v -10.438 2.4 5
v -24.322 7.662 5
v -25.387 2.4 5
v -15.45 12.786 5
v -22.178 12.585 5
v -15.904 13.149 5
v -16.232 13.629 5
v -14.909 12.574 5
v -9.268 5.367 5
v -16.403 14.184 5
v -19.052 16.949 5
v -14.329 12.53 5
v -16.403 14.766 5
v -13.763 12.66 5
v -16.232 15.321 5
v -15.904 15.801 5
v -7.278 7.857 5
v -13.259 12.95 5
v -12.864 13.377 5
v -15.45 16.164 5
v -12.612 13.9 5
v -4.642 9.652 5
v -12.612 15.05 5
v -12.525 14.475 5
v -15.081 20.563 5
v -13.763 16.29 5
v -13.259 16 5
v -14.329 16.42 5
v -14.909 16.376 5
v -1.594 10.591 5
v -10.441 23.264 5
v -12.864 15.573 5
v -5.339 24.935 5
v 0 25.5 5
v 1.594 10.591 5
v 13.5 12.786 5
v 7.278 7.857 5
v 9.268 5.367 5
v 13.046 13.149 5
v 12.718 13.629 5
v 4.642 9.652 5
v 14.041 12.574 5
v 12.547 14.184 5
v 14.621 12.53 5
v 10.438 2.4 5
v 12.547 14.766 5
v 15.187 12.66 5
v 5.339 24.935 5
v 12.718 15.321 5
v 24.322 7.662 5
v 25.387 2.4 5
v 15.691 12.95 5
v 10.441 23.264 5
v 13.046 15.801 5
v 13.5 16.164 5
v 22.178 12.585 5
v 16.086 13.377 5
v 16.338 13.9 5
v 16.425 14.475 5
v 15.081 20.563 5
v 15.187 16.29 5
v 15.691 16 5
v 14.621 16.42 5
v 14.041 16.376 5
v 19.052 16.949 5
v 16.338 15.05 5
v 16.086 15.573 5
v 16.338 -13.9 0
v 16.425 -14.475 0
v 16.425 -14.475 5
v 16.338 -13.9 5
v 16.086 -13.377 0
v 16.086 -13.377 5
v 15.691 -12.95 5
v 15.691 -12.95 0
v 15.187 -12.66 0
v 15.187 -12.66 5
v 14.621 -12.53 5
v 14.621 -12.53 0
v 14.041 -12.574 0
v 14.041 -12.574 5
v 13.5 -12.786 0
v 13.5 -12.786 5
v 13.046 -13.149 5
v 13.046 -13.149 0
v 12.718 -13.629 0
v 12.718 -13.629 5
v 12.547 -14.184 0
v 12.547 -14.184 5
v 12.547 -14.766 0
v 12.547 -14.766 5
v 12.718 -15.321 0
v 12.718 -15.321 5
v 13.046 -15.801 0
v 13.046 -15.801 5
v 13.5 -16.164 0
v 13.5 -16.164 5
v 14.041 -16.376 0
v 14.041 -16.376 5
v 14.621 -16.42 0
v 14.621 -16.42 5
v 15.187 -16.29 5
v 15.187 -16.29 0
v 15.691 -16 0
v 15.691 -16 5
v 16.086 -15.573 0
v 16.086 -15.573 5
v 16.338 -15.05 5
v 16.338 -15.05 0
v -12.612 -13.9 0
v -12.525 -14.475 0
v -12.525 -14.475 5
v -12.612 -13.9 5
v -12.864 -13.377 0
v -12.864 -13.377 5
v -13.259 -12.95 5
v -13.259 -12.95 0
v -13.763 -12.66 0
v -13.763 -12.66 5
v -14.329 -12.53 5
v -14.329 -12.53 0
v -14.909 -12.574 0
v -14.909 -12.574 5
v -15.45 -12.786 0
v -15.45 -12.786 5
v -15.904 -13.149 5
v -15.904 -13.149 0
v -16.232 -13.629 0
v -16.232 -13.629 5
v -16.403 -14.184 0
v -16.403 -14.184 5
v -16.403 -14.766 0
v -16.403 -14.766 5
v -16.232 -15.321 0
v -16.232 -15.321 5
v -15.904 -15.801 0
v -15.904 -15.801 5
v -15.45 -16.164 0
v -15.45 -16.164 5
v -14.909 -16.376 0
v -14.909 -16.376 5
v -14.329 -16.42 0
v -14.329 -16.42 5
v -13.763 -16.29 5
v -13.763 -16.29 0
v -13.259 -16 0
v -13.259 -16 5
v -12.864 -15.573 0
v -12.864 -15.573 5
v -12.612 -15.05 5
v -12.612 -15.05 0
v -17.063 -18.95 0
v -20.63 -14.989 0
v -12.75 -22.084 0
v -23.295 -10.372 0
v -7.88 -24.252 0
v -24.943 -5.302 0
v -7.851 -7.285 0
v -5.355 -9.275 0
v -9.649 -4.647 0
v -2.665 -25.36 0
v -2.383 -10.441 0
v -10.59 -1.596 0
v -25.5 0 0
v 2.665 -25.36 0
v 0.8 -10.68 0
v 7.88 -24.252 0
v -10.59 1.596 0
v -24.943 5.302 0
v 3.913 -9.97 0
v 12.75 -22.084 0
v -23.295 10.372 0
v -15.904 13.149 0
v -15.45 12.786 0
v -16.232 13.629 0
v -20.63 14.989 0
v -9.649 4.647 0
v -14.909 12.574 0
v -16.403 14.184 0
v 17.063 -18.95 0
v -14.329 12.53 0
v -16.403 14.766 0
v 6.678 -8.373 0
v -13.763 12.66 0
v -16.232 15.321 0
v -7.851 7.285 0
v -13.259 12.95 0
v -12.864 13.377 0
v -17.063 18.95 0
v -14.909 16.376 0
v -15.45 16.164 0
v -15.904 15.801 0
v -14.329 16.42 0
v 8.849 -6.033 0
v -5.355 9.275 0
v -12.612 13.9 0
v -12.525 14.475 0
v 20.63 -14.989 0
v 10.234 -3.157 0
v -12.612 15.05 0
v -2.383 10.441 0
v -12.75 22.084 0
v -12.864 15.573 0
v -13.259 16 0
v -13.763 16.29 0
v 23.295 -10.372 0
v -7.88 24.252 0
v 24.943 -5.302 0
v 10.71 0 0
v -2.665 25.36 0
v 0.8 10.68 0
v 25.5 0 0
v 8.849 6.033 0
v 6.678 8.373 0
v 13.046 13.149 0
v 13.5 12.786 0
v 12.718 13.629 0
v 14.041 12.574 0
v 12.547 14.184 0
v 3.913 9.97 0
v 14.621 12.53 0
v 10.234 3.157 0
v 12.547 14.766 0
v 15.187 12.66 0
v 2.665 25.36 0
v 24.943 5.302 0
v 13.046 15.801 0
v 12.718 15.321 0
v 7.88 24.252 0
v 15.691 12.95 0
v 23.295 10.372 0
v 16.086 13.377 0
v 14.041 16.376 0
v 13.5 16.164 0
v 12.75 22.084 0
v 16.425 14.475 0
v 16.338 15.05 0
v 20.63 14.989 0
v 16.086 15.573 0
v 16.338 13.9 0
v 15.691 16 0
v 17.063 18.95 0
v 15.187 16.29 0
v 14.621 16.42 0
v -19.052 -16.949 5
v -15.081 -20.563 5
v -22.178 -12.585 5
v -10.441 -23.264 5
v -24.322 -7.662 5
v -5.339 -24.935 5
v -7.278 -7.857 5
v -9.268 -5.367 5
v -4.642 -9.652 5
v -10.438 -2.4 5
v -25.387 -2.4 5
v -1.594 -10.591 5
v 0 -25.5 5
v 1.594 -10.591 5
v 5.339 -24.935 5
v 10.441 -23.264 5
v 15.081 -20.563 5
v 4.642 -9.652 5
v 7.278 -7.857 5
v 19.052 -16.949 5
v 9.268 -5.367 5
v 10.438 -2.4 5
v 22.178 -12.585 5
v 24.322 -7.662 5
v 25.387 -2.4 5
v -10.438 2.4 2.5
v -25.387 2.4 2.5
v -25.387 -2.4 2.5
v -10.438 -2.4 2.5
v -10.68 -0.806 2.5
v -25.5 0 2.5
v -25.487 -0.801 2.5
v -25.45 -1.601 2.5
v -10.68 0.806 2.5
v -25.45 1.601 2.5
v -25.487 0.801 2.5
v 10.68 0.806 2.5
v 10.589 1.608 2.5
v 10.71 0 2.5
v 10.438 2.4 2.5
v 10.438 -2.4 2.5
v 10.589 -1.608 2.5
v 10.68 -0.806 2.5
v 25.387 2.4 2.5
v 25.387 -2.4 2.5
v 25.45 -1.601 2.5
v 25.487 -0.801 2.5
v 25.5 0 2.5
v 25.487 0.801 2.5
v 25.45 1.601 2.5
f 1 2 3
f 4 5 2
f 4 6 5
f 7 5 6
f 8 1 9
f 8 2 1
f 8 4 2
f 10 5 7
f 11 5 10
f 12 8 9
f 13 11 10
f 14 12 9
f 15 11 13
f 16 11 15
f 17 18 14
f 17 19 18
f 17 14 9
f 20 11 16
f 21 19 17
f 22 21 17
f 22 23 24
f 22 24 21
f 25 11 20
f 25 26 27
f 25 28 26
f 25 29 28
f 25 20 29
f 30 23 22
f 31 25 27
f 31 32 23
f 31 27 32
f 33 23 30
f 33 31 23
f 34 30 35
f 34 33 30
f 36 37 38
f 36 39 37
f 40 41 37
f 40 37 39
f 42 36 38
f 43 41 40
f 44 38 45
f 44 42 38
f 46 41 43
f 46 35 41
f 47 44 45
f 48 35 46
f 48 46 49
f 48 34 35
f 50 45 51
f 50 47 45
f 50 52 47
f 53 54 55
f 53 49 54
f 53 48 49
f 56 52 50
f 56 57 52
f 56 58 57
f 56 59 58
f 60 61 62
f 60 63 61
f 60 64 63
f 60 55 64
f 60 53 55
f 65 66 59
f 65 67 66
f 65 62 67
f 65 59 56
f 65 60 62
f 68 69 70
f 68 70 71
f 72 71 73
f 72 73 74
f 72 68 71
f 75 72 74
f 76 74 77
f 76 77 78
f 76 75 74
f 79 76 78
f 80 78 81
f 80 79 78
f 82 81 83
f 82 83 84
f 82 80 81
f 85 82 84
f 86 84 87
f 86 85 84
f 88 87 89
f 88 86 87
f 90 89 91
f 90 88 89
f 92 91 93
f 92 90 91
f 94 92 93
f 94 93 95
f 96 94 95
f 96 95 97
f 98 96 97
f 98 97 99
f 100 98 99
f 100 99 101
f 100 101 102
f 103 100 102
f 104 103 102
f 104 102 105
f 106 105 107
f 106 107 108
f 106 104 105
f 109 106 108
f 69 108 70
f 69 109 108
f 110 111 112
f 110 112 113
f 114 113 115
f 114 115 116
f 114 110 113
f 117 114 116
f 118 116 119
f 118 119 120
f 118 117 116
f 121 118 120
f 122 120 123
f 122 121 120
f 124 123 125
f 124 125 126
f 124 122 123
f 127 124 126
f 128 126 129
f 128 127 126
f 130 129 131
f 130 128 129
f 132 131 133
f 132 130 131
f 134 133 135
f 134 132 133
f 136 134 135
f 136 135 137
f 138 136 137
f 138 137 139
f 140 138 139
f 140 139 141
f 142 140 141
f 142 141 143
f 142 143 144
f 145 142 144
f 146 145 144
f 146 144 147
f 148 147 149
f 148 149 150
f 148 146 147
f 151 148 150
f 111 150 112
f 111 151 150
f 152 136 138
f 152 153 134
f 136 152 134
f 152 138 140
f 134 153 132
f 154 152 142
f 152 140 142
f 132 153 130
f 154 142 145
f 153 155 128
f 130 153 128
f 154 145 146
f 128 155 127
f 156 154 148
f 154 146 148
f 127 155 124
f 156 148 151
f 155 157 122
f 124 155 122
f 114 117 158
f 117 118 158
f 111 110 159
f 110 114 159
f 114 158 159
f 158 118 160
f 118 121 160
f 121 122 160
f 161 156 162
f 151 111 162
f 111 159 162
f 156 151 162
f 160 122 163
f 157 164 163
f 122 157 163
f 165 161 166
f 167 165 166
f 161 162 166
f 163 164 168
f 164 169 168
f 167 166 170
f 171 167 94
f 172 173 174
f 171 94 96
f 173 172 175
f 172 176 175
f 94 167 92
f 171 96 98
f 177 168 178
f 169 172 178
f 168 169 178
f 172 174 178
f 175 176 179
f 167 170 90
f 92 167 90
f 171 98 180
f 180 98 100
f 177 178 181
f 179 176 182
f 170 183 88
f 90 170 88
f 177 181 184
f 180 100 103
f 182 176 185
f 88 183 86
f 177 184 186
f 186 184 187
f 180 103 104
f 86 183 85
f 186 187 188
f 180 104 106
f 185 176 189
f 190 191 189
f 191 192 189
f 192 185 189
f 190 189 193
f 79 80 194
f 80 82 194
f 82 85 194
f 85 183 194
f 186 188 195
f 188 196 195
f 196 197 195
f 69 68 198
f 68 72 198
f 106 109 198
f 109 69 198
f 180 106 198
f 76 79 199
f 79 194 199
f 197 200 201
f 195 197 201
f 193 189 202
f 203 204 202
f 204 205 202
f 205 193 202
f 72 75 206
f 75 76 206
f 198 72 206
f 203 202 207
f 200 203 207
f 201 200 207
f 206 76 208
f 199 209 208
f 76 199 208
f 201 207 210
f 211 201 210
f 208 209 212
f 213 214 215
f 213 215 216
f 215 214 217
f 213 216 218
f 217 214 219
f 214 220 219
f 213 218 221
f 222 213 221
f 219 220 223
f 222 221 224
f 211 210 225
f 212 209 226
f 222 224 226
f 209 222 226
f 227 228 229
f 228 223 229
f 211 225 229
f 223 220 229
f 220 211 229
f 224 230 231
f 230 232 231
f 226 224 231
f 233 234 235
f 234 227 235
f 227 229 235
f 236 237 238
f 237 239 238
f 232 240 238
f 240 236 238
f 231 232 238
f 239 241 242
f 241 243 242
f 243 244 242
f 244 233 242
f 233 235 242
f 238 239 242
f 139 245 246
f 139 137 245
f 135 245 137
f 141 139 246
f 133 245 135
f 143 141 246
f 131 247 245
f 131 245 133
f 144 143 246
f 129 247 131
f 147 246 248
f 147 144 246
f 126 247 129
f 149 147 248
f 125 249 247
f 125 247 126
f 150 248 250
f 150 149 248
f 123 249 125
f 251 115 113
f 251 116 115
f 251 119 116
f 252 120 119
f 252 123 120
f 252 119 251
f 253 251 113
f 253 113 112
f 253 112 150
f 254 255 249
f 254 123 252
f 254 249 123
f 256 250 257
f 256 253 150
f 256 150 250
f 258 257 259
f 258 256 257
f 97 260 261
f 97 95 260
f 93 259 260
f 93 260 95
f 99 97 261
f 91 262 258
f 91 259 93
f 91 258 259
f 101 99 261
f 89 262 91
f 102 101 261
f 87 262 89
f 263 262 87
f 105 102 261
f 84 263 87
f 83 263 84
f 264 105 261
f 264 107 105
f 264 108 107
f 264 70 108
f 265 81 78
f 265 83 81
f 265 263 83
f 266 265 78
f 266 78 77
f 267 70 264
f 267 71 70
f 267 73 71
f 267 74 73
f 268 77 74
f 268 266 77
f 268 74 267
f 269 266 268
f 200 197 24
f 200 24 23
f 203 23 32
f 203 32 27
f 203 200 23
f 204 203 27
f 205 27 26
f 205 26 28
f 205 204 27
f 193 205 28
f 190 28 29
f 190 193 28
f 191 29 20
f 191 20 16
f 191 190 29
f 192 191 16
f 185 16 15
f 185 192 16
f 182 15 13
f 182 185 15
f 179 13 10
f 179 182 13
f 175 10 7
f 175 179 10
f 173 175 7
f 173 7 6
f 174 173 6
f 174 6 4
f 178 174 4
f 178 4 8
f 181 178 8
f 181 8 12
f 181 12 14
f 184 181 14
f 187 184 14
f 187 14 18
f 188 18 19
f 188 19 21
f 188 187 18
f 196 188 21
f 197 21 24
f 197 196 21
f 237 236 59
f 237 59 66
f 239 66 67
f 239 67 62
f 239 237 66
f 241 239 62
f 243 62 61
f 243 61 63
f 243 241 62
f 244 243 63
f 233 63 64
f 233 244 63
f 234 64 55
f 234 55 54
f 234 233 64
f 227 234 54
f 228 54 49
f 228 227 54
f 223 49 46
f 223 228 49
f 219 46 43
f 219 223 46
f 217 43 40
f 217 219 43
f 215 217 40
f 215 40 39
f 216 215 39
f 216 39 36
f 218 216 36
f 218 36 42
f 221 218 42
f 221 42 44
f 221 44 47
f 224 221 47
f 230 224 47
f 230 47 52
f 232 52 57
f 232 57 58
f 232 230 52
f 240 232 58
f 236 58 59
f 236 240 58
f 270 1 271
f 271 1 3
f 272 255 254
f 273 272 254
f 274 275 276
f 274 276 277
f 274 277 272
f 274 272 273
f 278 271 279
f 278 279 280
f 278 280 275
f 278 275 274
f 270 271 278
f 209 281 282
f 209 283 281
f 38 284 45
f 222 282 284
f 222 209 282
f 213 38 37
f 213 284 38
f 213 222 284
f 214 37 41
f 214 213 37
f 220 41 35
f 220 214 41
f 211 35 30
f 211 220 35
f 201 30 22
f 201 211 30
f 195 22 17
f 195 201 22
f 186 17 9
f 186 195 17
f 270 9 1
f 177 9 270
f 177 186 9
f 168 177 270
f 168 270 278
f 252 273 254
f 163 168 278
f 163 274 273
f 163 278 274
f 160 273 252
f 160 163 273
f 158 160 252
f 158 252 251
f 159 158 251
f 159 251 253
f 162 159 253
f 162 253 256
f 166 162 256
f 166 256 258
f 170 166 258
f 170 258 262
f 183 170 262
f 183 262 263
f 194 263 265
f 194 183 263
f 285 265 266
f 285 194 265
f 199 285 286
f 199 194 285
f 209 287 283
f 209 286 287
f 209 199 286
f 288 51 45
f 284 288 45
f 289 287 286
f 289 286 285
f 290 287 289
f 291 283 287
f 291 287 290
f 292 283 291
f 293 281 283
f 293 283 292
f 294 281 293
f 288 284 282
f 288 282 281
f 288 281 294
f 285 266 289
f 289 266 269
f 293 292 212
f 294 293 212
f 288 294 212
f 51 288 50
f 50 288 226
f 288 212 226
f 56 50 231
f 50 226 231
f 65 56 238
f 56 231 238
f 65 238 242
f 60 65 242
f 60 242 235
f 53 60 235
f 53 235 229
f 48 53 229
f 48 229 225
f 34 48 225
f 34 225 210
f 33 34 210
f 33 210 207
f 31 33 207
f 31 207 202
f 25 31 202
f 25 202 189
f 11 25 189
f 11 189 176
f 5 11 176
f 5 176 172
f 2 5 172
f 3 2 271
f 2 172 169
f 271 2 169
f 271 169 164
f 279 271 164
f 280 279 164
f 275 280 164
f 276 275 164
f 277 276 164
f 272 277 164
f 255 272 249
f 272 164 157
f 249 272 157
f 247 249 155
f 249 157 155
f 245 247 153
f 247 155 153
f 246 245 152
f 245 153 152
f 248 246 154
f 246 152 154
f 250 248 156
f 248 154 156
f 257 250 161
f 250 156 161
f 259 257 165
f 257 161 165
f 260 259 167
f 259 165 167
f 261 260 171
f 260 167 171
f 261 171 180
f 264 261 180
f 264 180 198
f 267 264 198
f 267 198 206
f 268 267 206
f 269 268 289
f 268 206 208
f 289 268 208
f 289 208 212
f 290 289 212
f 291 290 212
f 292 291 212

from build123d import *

# Parameters (mm, degrees)
F0_R     = 25.5
F0_R_2   = 1.95
F0_R_3   = 10.71
F1_DEPTH = 5
F3_DEPTH = 2.5


with BuildPart() as f1:
    # F0 (on Top) → F1 (new body)
    with BuildSketch(Plane.XY):
        Circle(F0_R)
        with Locations((-14.475, -14.475)):
            Circle(F0_R_2, mode=Mode.SUBTRACT)
        with Locations((14.475, -14.475)):
            Circle(F0_R_2, mode=Mode.SUBTRACT)
        with Locations((-14.475, 14.475)):
            Circle(F0_R_2, mode=Mode.SUBTRACT)
        Circle(F0_R_3, mode=Mode.SUBTRACT)
        with Locations((14.475, 14.475)):
            Circle(F0_R_2, mode=Mode.SUBTRACT)
    extrude(amount=F1_DEPTH)

    # F2 (on face) → F3 (cut)
    with BuildSketch(Plane.XY.offset(5)):
        with BuildLine():
            Line((-10.4376290411, 2.4), (-25.3868075976, 2.4))
            ThreePointArc((-25.3868075976, 2.4), (-25.4716861803, 1.2013338961), (-25.5, 0))
            ThreePointArc((-25.5, 0), (-25.4716861803, -1.2013338961), (-25.3868075976, -2.4))
            Line((-25.3868075976, -2.4), (-10.4376290411, -2.4))
            ThreePointArc((-10.4376290411, -2.4), (-10.71, 0), (-10.4376290411, 2.4))
        make_face()
        with BuildLine():
            ThreePointArc((25.5, 0), (25.4716861803, 1.2013338961), (25.3868075976, 2.4))
            Line((25.3868075976, 2.4), (10.4376290411, 2.4))
            ThreePointArc((10.4376290411, 2.4), (10.6416894108, 1.2077029787), (10.71, 0))
            ThreePointArc((10.71, 0), (10.6416894108, -1.2077029787), (10.4376290411, -2.4))
            Line((10.4376290411, -2.4), (25.3868075976, -2.4))
            ThreePointArc((25.3868075976, -2.4), (25.4716861803, -1.2013338961), (25.5, 0))
        make_face()
    extrude(amount=-F3_DEPTH, mode=Mode.SUBTRACT)


solid = f1.part
